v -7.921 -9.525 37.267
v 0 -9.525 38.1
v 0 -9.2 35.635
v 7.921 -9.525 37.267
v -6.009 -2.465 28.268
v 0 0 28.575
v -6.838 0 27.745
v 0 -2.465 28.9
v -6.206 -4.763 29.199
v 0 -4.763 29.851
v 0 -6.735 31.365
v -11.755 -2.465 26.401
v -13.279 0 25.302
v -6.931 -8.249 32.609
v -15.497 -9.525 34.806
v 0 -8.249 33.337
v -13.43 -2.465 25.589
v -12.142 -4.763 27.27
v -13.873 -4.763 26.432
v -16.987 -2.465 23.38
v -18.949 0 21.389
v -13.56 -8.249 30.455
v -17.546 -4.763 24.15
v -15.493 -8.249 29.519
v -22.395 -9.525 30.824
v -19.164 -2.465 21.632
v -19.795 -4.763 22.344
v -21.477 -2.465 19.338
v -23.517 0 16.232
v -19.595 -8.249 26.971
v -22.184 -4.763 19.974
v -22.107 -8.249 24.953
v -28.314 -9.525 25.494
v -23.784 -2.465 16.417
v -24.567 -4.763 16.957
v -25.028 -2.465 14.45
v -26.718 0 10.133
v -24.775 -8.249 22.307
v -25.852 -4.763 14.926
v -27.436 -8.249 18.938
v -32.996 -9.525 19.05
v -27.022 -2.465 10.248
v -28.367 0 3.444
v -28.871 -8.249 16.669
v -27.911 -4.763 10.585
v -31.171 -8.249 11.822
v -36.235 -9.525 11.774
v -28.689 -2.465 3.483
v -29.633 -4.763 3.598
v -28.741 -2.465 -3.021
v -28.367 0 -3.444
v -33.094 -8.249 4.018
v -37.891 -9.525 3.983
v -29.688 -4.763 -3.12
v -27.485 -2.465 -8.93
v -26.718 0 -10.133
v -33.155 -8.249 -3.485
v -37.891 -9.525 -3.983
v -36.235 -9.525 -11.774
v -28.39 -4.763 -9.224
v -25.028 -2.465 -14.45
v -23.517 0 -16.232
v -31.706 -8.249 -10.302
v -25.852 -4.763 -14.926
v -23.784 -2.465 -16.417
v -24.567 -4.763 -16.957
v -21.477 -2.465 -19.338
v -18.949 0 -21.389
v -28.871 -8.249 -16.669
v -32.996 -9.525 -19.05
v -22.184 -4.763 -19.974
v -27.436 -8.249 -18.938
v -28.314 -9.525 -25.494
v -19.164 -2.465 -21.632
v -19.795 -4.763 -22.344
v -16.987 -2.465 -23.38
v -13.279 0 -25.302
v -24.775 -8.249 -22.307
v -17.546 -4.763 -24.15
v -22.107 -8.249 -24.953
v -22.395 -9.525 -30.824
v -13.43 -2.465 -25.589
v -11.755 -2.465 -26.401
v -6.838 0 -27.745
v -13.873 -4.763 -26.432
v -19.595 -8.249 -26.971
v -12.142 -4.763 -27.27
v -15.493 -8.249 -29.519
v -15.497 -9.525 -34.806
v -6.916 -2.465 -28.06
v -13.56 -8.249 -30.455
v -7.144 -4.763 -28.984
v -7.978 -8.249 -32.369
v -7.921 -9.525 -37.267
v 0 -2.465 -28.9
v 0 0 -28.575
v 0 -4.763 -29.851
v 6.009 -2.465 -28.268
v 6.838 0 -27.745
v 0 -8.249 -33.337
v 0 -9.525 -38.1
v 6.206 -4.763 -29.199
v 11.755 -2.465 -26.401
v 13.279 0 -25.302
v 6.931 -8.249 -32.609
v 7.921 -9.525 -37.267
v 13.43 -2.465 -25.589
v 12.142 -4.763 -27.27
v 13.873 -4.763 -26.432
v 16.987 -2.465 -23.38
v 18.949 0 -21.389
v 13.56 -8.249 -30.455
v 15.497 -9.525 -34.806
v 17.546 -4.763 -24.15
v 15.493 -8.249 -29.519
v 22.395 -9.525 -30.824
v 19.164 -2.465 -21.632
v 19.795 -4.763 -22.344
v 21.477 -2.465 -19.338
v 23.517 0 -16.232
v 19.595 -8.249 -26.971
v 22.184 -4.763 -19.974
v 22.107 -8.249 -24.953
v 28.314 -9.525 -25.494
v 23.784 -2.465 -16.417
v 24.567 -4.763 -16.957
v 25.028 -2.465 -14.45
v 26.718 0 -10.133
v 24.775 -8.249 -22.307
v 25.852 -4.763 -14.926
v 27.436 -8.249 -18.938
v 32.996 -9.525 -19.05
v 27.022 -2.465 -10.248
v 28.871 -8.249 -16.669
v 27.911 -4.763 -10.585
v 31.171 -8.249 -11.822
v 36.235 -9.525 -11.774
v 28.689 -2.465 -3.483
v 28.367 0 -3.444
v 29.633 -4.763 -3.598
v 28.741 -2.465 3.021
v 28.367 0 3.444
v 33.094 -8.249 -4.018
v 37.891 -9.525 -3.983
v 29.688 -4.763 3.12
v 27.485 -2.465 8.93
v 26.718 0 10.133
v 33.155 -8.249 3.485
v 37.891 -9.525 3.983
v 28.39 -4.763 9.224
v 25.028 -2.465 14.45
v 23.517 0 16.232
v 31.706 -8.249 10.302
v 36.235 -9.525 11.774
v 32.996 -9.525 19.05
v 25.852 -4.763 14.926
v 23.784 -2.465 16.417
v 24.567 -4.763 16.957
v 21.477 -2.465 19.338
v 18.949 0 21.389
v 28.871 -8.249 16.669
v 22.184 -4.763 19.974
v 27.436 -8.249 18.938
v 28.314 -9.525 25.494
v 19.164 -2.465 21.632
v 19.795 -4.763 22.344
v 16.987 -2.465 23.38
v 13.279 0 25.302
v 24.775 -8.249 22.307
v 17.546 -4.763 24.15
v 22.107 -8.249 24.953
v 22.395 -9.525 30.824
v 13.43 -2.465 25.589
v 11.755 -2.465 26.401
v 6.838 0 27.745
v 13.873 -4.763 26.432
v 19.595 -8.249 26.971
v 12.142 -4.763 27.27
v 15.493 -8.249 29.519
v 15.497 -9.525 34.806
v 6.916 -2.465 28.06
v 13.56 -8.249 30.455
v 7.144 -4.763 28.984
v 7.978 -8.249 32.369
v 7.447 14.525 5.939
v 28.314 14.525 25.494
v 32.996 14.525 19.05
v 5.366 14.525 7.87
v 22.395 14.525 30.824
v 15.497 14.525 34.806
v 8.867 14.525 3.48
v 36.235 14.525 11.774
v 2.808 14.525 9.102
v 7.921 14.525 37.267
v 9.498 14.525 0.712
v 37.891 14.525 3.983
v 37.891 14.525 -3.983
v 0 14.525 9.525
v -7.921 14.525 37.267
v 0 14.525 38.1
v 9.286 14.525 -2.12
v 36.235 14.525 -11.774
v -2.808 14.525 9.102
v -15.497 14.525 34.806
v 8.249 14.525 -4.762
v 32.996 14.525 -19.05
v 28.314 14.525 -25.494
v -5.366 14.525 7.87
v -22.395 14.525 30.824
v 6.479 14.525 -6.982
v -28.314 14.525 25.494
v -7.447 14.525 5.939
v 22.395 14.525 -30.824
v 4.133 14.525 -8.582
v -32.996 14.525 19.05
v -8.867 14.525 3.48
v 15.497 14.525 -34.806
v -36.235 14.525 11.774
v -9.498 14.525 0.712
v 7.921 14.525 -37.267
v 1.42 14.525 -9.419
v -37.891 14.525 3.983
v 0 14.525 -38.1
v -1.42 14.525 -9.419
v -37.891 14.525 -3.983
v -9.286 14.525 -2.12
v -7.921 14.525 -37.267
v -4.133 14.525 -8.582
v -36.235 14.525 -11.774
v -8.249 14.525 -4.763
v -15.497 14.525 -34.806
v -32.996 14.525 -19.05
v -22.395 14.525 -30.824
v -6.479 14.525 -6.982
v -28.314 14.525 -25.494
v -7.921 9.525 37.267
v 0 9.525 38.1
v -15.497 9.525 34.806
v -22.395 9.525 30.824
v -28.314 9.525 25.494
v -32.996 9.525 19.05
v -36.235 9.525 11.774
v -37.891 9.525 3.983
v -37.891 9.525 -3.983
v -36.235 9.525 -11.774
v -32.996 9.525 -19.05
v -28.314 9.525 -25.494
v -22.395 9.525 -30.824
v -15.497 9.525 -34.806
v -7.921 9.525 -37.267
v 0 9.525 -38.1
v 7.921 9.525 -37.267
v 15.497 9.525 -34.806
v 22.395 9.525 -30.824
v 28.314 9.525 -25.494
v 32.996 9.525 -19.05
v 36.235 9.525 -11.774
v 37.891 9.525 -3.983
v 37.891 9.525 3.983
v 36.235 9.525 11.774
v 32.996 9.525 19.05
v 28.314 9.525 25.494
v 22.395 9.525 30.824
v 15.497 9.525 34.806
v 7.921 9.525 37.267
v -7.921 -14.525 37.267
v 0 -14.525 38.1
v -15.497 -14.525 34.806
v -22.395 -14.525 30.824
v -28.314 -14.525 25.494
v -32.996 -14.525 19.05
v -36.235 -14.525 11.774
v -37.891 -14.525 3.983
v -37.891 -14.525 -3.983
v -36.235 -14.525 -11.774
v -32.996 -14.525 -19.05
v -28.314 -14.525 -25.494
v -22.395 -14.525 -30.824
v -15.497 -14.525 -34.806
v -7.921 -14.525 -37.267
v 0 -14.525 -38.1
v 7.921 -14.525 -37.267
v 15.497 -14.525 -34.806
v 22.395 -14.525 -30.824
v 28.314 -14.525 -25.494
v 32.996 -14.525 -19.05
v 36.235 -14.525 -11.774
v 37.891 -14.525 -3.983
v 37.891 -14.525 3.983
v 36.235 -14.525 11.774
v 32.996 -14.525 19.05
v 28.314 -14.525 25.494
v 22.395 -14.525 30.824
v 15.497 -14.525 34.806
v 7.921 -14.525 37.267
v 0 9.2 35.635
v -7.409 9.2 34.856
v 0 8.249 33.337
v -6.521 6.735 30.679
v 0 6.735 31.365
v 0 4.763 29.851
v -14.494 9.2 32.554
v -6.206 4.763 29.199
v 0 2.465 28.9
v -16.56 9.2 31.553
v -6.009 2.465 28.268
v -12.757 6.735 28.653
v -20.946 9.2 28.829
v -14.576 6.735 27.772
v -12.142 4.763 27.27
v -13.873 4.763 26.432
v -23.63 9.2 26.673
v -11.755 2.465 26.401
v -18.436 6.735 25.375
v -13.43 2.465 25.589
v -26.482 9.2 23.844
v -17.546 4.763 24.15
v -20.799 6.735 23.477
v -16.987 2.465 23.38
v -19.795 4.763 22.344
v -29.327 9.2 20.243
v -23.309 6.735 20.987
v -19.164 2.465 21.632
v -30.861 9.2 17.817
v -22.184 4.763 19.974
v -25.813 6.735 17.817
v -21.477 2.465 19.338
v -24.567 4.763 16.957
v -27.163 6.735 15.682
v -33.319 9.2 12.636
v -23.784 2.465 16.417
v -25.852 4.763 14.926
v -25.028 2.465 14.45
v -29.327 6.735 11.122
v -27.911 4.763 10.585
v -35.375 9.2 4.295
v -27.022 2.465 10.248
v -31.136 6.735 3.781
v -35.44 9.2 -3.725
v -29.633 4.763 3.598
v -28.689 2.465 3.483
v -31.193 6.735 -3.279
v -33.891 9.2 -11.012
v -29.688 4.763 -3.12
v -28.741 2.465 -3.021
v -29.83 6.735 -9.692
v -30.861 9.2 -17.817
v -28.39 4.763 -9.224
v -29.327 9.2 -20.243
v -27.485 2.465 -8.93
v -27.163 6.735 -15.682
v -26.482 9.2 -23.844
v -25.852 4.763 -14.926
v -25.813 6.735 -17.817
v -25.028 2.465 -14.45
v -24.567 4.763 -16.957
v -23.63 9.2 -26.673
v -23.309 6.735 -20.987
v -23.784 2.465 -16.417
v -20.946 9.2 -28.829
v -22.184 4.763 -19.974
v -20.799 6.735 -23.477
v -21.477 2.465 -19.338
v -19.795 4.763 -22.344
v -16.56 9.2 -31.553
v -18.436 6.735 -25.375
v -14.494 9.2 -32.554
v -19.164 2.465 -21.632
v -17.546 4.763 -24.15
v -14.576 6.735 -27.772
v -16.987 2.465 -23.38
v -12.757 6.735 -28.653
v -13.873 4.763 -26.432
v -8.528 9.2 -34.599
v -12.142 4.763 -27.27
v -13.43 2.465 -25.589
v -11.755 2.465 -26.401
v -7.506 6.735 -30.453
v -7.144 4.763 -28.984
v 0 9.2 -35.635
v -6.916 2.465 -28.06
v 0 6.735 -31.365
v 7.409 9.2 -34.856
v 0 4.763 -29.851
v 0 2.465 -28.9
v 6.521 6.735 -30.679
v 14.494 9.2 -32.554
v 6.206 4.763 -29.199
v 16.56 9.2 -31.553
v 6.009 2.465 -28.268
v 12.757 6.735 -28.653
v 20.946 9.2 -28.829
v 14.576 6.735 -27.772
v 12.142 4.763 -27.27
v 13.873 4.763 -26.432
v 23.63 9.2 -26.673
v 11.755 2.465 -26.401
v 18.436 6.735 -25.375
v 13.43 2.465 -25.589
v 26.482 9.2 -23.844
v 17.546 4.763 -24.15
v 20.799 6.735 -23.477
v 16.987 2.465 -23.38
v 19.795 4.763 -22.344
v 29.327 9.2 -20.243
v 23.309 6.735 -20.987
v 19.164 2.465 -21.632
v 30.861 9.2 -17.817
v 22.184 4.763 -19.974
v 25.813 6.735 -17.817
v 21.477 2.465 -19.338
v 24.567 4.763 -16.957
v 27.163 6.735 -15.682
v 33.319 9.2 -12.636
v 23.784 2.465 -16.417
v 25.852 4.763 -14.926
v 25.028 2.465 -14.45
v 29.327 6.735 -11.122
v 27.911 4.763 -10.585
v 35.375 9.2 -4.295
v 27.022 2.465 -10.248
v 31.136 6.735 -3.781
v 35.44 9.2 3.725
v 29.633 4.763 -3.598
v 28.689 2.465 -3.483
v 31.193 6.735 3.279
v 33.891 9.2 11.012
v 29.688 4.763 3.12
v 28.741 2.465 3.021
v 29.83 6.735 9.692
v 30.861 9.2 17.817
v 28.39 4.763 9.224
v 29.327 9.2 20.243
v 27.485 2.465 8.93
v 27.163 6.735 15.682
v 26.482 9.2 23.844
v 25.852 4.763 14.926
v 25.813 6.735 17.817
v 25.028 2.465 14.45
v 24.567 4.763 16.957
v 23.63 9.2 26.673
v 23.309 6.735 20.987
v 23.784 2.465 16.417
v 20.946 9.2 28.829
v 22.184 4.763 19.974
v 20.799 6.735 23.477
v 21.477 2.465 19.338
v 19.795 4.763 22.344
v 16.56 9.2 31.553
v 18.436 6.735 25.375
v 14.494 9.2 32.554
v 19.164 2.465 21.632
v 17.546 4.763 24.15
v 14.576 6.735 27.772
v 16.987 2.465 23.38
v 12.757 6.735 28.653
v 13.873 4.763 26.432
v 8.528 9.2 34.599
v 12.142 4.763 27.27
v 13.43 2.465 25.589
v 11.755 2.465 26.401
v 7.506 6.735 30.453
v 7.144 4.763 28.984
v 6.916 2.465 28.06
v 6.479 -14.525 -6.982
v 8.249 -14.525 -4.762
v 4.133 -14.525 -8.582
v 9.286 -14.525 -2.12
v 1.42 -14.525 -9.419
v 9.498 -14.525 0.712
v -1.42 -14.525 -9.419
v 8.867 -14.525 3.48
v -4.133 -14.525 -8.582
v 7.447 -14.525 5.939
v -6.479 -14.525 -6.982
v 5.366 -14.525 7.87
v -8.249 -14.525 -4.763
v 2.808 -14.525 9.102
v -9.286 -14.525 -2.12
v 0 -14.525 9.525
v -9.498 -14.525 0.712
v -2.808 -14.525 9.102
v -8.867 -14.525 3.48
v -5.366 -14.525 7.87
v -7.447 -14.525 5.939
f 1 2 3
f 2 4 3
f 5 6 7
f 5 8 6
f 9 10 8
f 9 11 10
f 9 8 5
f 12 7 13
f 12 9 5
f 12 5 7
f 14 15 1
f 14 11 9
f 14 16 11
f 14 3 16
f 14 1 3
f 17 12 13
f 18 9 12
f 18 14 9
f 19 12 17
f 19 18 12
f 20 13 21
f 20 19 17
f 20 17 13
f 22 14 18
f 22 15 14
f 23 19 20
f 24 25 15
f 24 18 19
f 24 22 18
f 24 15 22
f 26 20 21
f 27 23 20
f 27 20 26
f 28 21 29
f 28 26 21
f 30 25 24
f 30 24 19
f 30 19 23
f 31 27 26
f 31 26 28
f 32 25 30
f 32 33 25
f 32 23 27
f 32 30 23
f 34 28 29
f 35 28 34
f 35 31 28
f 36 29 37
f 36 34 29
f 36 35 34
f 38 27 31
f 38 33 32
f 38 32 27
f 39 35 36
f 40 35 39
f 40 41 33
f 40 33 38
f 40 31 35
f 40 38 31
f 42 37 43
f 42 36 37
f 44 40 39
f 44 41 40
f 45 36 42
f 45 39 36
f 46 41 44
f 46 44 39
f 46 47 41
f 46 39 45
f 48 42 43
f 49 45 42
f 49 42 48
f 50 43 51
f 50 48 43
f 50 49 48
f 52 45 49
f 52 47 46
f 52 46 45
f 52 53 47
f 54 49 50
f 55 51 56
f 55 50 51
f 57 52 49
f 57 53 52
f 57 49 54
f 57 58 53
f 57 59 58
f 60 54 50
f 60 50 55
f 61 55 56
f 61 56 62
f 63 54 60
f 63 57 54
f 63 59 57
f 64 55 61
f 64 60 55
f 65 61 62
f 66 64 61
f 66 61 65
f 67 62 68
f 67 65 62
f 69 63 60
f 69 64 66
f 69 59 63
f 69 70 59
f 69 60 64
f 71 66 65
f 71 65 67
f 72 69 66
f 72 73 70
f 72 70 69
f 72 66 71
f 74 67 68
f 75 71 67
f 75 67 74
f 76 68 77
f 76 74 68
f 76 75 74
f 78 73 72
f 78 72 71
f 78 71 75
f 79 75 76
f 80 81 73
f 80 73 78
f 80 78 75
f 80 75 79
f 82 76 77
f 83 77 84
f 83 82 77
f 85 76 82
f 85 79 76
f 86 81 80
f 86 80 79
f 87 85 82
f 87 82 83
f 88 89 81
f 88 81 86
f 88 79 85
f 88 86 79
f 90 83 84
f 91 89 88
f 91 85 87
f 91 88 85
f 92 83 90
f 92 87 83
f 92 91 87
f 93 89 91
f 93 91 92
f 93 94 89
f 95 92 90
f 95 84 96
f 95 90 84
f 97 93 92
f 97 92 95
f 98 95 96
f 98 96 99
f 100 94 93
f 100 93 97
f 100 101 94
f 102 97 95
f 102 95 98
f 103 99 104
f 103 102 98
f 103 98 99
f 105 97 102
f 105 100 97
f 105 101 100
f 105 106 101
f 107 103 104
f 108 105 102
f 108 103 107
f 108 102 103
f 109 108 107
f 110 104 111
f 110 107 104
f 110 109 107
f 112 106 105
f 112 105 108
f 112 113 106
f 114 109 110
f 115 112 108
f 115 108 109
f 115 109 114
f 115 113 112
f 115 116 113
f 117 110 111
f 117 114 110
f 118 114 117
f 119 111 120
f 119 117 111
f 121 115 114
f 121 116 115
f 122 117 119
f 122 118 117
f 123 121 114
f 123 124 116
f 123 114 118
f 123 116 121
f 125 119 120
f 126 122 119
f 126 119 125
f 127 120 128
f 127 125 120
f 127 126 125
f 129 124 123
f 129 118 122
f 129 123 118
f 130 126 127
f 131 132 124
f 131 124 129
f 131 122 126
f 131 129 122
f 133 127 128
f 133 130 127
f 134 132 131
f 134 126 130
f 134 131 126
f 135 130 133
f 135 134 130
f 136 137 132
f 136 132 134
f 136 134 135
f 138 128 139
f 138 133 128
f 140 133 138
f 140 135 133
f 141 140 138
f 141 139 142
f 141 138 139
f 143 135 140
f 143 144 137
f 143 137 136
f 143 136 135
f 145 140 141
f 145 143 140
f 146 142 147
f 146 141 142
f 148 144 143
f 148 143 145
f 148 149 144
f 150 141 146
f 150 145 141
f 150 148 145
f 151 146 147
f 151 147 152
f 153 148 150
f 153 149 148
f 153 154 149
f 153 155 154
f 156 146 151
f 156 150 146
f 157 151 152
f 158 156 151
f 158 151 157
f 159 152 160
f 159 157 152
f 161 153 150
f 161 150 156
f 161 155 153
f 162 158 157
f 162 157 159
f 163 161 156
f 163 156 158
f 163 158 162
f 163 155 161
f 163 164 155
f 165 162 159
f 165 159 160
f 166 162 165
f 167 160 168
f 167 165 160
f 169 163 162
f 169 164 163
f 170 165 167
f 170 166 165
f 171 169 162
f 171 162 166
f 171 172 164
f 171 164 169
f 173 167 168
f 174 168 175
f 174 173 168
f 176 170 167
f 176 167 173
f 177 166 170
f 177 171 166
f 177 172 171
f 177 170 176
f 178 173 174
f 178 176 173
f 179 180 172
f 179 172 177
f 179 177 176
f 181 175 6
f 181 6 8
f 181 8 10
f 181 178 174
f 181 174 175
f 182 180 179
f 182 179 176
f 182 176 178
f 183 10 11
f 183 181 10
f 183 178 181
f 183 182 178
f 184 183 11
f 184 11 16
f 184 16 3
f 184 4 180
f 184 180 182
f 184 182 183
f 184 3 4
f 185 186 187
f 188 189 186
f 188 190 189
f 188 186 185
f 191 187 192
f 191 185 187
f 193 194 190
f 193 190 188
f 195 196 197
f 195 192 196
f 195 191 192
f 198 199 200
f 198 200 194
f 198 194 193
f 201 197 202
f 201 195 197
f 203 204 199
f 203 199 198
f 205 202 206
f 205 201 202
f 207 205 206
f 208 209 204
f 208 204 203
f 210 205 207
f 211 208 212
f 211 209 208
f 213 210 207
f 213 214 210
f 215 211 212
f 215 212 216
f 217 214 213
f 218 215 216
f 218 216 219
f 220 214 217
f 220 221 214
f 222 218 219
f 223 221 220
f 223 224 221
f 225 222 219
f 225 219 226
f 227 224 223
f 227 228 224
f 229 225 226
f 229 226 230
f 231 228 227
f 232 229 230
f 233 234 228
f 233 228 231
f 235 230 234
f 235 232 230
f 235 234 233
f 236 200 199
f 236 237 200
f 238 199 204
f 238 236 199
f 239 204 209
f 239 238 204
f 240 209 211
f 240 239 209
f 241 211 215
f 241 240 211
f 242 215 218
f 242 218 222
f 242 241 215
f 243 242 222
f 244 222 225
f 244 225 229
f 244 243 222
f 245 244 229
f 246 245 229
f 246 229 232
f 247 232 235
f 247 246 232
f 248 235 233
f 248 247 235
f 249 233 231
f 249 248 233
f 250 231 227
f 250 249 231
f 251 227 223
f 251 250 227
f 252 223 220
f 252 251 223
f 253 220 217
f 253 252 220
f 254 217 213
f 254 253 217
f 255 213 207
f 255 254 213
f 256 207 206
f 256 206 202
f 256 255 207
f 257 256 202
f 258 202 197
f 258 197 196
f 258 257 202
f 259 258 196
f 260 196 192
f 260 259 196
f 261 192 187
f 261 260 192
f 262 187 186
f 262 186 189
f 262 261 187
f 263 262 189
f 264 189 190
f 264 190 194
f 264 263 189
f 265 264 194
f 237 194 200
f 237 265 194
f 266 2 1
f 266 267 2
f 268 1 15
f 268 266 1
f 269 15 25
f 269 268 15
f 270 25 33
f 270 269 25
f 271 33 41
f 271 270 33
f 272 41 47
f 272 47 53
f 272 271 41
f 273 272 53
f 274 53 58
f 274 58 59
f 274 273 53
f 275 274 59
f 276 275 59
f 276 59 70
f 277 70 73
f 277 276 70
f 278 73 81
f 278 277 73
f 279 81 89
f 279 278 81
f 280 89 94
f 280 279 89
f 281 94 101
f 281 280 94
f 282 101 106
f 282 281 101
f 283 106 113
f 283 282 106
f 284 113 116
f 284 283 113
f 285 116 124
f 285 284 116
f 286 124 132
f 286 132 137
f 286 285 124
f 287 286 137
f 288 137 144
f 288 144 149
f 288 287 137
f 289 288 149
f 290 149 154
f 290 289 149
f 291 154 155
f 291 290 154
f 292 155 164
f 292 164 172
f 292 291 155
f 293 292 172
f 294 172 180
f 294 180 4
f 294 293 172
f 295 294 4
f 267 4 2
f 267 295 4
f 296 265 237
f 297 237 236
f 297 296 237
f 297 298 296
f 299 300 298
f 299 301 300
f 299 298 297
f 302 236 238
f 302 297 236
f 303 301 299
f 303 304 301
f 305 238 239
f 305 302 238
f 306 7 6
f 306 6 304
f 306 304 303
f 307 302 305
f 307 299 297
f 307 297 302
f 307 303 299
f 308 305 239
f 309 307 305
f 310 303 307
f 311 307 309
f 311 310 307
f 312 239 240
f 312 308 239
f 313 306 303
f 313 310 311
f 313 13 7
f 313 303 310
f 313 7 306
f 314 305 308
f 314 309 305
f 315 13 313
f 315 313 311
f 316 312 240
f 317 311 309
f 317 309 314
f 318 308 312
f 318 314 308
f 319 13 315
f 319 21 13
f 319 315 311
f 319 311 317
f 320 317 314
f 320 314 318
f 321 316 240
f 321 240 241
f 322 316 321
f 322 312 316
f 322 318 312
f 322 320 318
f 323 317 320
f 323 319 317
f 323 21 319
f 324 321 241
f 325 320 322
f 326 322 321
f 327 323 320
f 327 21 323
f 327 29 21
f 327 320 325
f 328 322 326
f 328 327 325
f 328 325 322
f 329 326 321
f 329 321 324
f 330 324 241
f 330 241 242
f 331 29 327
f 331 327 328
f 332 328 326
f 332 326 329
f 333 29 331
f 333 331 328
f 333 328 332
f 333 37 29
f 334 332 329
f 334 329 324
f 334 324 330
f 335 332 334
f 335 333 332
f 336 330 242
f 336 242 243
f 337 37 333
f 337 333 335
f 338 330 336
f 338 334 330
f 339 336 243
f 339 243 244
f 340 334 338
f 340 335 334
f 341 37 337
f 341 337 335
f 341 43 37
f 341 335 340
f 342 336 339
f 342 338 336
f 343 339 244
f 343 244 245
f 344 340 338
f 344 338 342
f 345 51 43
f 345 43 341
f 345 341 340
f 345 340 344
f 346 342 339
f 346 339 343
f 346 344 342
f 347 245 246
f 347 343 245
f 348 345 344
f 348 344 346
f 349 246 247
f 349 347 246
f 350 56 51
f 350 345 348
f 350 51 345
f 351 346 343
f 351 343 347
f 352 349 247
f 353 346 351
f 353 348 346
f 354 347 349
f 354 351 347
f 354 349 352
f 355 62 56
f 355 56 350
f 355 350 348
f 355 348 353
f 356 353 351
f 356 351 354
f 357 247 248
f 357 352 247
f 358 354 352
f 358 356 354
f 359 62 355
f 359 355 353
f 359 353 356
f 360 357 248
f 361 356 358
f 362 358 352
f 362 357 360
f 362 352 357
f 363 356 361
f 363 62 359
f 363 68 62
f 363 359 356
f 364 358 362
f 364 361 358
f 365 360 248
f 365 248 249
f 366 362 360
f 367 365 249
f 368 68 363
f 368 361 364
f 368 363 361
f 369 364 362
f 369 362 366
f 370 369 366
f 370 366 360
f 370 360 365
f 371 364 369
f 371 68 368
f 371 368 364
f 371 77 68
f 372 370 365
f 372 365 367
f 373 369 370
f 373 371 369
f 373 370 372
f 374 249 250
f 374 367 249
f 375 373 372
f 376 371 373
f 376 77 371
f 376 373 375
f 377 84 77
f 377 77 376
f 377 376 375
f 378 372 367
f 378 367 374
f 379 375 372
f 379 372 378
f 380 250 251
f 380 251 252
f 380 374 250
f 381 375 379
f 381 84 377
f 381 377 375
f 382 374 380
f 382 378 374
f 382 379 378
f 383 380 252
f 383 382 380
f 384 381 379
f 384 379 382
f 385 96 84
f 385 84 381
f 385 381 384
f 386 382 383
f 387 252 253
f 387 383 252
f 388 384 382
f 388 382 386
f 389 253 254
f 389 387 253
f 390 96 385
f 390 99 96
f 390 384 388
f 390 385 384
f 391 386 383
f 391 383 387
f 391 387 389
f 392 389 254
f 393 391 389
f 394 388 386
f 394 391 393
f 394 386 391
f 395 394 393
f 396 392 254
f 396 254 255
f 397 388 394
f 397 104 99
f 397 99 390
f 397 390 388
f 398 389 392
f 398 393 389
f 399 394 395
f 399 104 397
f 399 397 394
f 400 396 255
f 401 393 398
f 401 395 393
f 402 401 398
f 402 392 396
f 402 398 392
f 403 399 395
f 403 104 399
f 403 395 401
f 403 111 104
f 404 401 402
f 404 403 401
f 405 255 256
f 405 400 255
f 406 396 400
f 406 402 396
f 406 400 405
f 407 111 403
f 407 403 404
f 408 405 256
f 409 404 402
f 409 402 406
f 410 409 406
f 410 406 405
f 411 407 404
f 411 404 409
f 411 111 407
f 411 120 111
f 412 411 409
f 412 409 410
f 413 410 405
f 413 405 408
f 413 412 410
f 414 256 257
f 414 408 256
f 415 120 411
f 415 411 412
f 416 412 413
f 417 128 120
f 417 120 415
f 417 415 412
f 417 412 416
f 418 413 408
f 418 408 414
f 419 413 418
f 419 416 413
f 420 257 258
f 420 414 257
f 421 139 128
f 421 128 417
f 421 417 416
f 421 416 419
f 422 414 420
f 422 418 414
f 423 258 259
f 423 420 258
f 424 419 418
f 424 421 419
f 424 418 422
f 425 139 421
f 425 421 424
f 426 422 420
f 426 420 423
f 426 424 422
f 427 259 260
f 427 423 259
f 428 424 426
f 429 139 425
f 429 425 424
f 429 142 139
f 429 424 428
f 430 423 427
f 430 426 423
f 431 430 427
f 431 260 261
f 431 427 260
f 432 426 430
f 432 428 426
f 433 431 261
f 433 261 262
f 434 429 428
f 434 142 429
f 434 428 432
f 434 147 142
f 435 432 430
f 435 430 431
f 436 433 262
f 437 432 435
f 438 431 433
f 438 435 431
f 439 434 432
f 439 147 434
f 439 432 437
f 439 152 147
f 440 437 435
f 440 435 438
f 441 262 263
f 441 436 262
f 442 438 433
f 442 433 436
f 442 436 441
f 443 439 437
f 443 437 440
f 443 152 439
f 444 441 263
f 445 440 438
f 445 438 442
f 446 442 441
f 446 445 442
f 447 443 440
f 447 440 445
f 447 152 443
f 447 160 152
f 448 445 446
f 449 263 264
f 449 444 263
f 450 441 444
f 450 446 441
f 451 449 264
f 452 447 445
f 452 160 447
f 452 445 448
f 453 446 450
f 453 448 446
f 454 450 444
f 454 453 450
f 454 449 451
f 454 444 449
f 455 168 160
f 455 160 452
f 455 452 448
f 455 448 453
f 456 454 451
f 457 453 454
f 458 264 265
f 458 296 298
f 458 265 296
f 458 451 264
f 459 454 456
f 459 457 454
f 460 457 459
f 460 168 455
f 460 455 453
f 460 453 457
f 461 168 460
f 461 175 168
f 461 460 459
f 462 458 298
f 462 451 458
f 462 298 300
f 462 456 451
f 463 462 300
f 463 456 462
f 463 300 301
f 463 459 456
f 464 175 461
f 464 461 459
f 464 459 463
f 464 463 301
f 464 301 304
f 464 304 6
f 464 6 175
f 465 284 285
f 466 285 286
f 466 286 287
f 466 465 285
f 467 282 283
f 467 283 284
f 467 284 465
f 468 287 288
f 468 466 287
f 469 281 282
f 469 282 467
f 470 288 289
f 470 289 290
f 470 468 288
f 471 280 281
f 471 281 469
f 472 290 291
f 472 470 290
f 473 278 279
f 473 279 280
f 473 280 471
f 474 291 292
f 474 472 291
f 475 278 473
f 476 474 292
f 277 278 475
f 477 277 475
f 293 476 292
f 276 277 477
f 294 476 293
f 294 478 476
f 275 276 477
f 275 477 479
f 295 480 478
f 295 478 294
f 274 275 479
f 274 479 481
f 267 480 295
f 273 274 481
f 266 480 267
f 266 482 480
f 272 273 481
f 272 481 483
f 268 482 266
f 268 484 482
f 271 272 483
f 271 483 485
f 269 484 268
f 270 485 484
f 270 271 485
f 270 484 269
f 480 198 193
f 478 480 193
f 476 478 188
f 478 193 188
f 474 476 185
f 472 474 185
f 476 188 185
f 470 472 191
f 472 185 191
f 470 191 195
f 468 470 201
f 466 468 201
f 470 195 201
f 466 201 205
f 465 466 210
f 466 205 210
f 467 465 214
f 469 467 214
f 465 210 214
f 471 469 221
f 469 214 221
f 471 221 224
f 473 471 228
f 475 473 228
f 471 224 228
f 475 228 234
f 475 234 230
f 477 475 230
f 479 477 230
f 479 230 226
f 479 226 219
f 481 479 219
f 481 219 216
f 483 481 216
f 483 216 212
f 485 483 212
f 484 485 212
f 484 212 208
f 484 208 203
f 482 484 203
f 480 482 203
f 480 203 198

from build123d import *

# Parameters (mm, degrees)
CROQUIS2_R            = 9.525
CORTAR_EXTRUIR1_DEPTH = 40


with BuildPart() as part:
    # Croquis1 → Revolución1 (revolve)
    with BuildSketch(Plane.XY, mode=Mode.PRIVATE) as revoluci_n1_sk:
        with BuildLine():
            Line((0, 0), (0, 14.525))
            Line((0, 14.525), (-38.1, 14.525))
            Line((-38.1, 14.525), (-38.1, 9.525))
            ThreePointArc((-38.1, 9.525), (-31.364807909, 6.735192091), (-28.575, 0))
            Line((-28.575, 0), (0, 0))
        make_face()
        with BuildLine():
            Line((0, -14.525), (0, 0))
            Line((0, 0), (-28.575, 0))
            ThreePointArc((-28.575, 0), (-31.364807909, -6.735192091), (-38.1, -9.525))
            Line((-38.1, -9.525), (-38.1, -14.525))
            Line((-38.1, -14.525), (0, -14.525))
        make_face()
    revolve(revoluci_n1_sk.sketch.rotate(Axis((0, 62.433588071, 0), (0, -1, 0)), 270), axis=Axis((0, 62.433588071, 0), (0, -1, 0)))

    # Croquis2 → Cortar-Extruir1 (cut)
    with BuildSketch(Plane(origin=(0, 14.525, 0), x_dir=(1, 0, 0), z_dir=(0, 1, 0))):
        with Locations(Location((0, 0, 0), (0, 0, 270))):
            Circle(CROQUIS2_R)
    extrude(amount=-CORTAR_EXTRUIR1_DEPTH, mode=Mode.SUBTRACT)


solid = part.part
